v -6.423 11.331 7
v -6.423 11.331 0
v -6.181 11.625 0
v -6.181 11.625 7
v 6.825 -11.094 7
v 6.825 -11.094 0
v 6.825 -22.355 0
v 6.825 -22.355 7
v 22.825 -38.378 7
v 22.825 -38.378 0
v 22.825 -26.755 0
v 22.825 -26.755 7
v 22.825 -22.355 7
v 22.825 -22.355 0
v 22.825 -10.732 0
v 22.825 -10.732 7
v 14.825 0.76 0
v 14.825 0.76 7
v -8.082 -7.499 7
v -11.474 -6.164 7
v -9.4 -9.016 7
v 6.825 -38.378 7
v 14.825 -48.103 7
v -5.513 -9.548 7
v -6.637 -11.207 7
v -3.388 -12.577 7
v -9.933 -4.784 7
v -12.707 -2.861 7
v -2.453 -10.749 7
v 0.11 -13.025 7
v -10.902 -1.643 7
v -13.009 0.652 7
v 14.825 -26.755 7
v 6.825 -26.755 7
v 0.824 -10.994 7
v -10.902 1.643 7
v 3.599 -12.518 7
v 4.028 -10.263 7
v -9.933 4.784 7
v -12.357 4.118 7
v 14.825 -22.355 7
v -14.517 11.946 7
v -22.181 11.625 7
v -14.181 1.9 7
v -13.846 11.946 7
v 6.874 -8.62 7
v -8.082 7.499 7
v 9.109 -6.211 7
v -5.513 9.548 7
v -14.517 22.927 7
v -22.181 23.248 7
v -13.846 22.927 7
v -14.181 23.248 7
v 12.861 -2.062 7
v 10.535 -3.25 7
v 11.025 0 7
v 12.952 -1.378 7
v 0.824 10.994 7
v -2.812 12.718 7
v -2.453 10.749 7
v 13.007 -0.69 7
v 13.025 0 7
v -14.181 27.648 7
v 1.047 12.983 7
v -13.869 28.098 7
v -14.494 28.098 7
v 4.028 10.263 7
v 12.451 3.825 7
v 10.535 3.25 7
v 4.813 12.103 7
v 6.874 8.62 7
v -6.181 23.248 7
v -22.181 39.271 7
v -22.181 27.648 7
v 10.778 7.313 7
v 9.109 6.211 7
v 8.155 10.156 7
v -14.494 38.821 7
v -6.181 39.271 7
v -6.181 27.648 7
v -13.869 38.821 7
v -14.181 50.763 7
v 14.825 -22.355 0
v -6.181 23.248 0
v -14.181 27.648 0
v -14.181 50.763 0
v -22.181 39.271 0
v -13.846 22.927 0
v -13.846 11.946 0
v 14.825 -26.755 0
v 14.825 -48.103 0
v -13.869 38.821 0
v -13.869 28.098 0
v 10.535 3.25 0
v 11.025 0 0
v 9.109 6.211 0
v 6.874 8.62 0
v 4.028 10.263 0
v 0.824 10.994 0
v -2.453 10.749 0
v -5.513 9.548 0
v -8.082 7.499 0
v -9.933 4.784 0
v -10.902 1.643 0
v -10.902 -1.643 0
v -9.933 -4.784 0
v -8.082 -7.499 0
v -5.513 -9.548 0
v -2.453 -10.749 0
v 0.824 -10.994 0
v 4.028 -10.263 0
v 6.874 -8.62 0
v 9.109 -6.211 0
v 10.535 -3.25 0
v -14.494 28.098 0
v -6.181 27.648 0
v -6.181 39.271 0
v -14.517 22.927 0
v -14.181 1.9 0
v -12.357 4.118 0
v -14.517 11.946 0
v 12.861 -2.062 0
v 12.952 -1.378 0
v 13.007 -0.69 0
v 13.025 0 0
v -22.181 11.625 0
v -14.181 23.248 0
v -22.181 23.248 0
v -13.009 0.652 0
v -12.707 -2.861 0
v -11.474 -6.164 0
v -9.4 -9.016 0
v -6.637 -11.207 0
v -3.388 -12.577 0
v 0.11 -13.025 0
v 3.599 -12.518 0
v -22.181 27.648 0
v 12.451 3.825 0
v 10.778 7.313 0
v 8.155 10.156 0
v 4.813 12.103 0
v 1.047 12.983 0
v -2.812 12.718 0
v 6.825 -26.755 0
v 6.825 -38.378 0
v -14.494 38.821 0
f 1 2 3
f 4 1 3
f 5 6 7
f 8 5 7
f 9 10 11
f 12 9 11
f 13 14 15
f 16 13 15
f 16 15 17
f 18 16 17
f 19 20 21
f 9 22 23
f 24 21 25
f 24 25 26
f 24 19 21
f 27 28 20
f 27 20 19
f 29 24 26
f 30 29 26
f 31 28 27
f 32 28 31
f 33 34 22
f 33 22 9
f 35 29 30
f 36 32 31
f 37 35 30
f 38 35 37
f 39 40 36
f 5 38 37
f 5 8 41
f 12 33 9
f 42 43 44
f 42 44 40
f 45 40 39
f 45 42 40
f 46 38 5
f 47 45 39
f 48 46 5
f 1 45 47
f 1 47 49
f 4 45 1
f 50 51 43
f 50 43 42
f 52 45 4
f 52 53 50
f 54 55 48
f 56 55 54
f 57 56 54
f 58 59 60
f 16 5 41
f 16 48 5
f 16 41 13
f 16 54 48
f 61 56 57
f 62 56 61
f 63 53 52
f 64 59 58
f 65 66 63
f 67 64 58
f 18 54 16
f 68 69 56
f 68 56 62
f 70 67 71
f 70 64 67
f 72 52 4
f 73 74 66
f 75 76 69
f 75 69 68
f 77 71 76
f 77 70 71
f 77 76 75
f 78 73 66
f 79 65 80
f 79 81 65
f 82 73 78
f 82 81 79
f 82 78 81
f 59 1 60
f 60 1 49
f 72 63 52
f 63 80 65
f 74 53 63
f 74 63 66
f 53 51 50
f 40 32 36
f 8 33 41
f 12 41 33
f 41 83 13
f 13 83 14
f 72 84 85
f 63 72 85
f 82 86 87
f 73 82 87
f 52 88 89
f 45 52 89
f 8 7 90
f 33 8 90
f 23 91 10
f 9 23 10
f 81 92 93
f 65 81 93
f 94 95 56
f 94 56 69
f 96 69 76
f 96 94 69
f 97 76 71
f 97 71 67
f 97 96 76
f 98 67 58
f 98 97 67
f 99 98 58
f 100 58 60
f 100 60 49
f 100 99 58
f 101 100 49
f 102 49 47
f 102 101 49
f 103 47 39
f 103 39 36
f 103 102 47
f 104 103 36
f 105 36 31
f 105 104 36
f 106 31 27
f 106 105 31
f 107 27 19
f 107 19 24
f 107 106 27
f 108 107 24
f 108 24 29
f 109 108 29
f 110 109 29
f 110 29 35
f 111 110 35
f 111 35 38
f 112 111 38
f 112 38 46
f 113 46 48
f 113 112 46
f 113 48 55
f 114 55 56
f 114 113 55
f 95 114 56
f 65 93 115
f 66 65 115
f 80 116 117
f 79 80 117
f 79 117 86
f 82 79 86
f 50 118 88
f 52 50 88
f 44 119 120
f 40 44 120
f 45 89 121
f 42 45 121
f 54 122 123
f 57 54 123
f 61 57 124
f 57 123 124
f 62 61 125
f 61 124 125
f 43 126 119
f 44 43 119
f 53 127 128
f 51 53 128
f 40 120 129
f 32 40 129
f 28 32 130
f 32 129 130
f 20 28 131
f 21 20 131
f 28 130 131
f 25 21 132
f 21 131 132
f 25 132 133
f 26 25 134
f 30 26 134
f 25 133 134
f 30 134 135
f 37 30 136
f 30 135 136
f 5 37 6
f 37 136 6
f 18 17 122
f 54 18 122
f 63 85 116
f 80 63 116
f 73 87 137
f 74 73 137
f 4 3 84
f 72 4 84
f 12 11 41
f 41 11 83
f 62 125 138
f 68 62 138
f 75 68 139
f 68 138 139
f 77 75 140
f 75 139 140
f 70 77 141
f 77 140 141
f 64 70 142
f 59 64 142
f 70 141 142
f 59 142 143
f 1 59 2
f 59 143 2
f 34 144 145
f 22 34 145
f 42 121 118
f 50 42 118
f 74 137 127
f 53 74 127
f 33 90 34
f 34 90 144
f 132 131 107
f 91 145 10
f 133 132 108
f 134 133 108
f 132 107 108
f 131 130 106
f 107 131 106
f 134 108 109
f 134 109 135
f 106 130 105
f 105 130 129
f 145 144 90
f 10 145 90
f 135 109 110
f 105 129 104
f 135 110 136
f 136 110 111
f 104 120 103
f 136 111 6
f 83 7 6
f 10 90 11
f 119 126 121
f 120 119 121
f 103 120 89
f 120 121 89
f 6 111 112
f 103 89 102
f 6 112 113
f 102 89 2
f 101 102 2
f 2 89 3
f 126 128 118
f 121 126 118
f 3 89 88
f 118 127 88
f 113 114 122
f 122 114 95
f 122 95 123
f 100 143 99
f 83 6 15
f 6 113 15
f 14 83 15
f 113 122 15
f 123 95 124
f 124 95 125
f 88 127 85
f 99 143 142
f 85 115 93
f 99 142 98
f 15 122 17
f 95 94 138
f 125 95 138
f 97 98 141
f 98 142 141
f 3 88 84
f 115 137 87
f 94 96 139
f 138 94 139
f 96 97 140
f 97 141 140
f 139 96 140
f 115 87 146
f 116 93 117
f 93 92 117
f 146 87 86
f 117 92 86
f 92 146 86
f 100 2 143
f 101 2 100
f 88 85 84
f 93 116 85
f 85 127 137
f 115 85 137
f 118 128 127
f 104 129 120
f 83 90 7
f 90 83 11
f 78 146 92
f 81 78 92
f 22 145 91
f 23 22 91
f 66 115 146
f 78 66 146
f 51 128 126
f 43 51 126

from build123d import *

# Parameters (mm, degrees)
F0_R     = 11.025
F1_DEPTH = 7


with BuildPart() as f1:
    # F0 (on Top) → F1 (new body)
    with BuildSketch(Plane.XY):
        with BuildLine():
            ThreePointArc((12.8607921453, -2.061710365), (12.9838831161, -1.0341196545), (13.0249999706, 0))
            ThreePointArc((13.0249999706, 0), (6.5569336334, 11.254210126), (-6.423329526, 11.330995633))
            Line((-6.423329526, 11.330995633), (-12.3569446603, 4.1178323055))
            ThreePointArc((-12.3569446603, 4.1178323055), (-8.0930947102, -10.2055103863), (6.8250050843, -11.0936887388))
            Line((6.8250050843, -11.0936887388), (6.8250050843, -10.7323580555))
            Line((6.8250050843, -10.7323580555), (12.8607921453, -2.061710365))
        make_face()
        Circle(F0_R, mode=Mode.SUBTRACT)
        with BuildLine():
            Line((-12.3569446603, 4.1178323055), (-6.423329526, 11.330995633))
            ThreePointArc((-6.423329526, 11.330995633), (-10.0589316493, 8.2745705815), (-12.3569446603, 4.1178323055))
        make_face()
        with BuildLine():
            ThreePointArc((-12.3569446603, 4.1178323055), (-10.0589316493, 8.2745705815), (-6.423329526, 11.330995633))
            Line((-6.423329526, 11.330995633), (-6.1813540831, 11.6251516156))
            Line((-6.1813540831, 11.6251516156), (-6.1813540831, 23.2478915714))
            Line((-6.1813540831, 23.2478915714), (-14.1813540831, 27.6478952728))
            Line((-14.1813540831, 27.6478952728), (-6.1813540831, 27.6478952728))
            Line((-6.1813540831, 27.6478952728), (-6.1813540831, 39.2706352286))
            Line((-6.1813540831, 39.2706352286), (-14.1813540831, 50.762952771))
            Line((-14.1813540831, 50.762952771), (-22.1813540831, 39.2706352286))
            Line((-22.1813540831, 39.2706352286), (-22.1813540831, 27.6478952728))
            Line((-22.1813540831, 27.6478952728), (-14.1813540831, 23.2478915714))
            Line((-14.1813540831, 23.2478915714), (-22.1813540831, 23.2478915714))
            Line((-22.1813540831, 23.2478915714), (-22.1813540831, 11.6251516156))
            Line((-22.1813540831, 11.6251516156), (-14.1813540831, 1.900000032))
            Line((-14.1813540831, 1.900000032), (-12.3569446603, 4.1178323055))
        make_face()
        Polygon((-14.5165706053, 22.92711474), (-14.1813540831, 22.92711474), (-13.8461375609, 22.92711474), (-13.8461375609, 11.9459284469), (-14.1813540831, 11.9459284469), (-14.5165706053, 11.9459284469), align=None, mode=Mode.SUBTRACT)
        Polygon((-13.8690257445, 28.0980104581), (-14.1813540831, 28.0980104581), (-14.4936824217, 28.0980104581), (-14.4936824217, 38.8205200434), (-14.1813540831, 38.8205200434), (-13.8690257445, 38.8205200434), align=None, mode=Mode.SUBTRACT)
        with BuildLine():
            Line((14.8250050843, 0.759959487), (12.8607921453, -2.061710365))
            ThreePointArc((12.8607921453, -2.061710365), (10.829441882, -7.2369753873), (6.8250050843, -11.0936887388))
            Line((6.8250050843, -11.0936887388), (6.8250050843, -22.3550980112))
            Line((6.8250050843, -22.3550980112), (14.8250050843, -26.7551017127))
            Line((14.8250050843, -26.7551017127), (6.8250050843, -26.7551017127))
            Line((6.8250050843, -26.7551017127), (6.8250050843, -38.3778416685))
            Line((6.8250050843, -38.3778416685), (14.8250050843, -48.102993252))
            Line((14.8250050843, -48.102993252), (22.8250050843, -38.3778416685))
            Line((22.8250050843, -38.3778416685), (22.8250050843, -26.7551017127))
            Line((22.8250050843, -26.7551017127), (14.8250050843, -22.3550980112))
            Line((14.8250050843, -22.3550980112), (22.8250050843, -22.3550980112))
            Line((22.8250050843, -22.3550980112), (22.8250050843, -10.7323580555))
            Line((22.8250050843, -10.7323580555), (14.8250050843, 0.759959487))
        make_face()
        with BuildLine():
            ThreePointArc((6.8250050843, -11.0936887388), (10.829441882, -7.2369753873), (12.8607921453, -2.061710365))
            Line((12.8607921453, -2.061710365), (6.8250050843, -10.7323580555))
            Line((6.8250050843, -10.7323580555), (6.8250050843, -11.0936887388))
        make_face()
    extrude(amount=F1_DEPTH)


solid = f1.part
